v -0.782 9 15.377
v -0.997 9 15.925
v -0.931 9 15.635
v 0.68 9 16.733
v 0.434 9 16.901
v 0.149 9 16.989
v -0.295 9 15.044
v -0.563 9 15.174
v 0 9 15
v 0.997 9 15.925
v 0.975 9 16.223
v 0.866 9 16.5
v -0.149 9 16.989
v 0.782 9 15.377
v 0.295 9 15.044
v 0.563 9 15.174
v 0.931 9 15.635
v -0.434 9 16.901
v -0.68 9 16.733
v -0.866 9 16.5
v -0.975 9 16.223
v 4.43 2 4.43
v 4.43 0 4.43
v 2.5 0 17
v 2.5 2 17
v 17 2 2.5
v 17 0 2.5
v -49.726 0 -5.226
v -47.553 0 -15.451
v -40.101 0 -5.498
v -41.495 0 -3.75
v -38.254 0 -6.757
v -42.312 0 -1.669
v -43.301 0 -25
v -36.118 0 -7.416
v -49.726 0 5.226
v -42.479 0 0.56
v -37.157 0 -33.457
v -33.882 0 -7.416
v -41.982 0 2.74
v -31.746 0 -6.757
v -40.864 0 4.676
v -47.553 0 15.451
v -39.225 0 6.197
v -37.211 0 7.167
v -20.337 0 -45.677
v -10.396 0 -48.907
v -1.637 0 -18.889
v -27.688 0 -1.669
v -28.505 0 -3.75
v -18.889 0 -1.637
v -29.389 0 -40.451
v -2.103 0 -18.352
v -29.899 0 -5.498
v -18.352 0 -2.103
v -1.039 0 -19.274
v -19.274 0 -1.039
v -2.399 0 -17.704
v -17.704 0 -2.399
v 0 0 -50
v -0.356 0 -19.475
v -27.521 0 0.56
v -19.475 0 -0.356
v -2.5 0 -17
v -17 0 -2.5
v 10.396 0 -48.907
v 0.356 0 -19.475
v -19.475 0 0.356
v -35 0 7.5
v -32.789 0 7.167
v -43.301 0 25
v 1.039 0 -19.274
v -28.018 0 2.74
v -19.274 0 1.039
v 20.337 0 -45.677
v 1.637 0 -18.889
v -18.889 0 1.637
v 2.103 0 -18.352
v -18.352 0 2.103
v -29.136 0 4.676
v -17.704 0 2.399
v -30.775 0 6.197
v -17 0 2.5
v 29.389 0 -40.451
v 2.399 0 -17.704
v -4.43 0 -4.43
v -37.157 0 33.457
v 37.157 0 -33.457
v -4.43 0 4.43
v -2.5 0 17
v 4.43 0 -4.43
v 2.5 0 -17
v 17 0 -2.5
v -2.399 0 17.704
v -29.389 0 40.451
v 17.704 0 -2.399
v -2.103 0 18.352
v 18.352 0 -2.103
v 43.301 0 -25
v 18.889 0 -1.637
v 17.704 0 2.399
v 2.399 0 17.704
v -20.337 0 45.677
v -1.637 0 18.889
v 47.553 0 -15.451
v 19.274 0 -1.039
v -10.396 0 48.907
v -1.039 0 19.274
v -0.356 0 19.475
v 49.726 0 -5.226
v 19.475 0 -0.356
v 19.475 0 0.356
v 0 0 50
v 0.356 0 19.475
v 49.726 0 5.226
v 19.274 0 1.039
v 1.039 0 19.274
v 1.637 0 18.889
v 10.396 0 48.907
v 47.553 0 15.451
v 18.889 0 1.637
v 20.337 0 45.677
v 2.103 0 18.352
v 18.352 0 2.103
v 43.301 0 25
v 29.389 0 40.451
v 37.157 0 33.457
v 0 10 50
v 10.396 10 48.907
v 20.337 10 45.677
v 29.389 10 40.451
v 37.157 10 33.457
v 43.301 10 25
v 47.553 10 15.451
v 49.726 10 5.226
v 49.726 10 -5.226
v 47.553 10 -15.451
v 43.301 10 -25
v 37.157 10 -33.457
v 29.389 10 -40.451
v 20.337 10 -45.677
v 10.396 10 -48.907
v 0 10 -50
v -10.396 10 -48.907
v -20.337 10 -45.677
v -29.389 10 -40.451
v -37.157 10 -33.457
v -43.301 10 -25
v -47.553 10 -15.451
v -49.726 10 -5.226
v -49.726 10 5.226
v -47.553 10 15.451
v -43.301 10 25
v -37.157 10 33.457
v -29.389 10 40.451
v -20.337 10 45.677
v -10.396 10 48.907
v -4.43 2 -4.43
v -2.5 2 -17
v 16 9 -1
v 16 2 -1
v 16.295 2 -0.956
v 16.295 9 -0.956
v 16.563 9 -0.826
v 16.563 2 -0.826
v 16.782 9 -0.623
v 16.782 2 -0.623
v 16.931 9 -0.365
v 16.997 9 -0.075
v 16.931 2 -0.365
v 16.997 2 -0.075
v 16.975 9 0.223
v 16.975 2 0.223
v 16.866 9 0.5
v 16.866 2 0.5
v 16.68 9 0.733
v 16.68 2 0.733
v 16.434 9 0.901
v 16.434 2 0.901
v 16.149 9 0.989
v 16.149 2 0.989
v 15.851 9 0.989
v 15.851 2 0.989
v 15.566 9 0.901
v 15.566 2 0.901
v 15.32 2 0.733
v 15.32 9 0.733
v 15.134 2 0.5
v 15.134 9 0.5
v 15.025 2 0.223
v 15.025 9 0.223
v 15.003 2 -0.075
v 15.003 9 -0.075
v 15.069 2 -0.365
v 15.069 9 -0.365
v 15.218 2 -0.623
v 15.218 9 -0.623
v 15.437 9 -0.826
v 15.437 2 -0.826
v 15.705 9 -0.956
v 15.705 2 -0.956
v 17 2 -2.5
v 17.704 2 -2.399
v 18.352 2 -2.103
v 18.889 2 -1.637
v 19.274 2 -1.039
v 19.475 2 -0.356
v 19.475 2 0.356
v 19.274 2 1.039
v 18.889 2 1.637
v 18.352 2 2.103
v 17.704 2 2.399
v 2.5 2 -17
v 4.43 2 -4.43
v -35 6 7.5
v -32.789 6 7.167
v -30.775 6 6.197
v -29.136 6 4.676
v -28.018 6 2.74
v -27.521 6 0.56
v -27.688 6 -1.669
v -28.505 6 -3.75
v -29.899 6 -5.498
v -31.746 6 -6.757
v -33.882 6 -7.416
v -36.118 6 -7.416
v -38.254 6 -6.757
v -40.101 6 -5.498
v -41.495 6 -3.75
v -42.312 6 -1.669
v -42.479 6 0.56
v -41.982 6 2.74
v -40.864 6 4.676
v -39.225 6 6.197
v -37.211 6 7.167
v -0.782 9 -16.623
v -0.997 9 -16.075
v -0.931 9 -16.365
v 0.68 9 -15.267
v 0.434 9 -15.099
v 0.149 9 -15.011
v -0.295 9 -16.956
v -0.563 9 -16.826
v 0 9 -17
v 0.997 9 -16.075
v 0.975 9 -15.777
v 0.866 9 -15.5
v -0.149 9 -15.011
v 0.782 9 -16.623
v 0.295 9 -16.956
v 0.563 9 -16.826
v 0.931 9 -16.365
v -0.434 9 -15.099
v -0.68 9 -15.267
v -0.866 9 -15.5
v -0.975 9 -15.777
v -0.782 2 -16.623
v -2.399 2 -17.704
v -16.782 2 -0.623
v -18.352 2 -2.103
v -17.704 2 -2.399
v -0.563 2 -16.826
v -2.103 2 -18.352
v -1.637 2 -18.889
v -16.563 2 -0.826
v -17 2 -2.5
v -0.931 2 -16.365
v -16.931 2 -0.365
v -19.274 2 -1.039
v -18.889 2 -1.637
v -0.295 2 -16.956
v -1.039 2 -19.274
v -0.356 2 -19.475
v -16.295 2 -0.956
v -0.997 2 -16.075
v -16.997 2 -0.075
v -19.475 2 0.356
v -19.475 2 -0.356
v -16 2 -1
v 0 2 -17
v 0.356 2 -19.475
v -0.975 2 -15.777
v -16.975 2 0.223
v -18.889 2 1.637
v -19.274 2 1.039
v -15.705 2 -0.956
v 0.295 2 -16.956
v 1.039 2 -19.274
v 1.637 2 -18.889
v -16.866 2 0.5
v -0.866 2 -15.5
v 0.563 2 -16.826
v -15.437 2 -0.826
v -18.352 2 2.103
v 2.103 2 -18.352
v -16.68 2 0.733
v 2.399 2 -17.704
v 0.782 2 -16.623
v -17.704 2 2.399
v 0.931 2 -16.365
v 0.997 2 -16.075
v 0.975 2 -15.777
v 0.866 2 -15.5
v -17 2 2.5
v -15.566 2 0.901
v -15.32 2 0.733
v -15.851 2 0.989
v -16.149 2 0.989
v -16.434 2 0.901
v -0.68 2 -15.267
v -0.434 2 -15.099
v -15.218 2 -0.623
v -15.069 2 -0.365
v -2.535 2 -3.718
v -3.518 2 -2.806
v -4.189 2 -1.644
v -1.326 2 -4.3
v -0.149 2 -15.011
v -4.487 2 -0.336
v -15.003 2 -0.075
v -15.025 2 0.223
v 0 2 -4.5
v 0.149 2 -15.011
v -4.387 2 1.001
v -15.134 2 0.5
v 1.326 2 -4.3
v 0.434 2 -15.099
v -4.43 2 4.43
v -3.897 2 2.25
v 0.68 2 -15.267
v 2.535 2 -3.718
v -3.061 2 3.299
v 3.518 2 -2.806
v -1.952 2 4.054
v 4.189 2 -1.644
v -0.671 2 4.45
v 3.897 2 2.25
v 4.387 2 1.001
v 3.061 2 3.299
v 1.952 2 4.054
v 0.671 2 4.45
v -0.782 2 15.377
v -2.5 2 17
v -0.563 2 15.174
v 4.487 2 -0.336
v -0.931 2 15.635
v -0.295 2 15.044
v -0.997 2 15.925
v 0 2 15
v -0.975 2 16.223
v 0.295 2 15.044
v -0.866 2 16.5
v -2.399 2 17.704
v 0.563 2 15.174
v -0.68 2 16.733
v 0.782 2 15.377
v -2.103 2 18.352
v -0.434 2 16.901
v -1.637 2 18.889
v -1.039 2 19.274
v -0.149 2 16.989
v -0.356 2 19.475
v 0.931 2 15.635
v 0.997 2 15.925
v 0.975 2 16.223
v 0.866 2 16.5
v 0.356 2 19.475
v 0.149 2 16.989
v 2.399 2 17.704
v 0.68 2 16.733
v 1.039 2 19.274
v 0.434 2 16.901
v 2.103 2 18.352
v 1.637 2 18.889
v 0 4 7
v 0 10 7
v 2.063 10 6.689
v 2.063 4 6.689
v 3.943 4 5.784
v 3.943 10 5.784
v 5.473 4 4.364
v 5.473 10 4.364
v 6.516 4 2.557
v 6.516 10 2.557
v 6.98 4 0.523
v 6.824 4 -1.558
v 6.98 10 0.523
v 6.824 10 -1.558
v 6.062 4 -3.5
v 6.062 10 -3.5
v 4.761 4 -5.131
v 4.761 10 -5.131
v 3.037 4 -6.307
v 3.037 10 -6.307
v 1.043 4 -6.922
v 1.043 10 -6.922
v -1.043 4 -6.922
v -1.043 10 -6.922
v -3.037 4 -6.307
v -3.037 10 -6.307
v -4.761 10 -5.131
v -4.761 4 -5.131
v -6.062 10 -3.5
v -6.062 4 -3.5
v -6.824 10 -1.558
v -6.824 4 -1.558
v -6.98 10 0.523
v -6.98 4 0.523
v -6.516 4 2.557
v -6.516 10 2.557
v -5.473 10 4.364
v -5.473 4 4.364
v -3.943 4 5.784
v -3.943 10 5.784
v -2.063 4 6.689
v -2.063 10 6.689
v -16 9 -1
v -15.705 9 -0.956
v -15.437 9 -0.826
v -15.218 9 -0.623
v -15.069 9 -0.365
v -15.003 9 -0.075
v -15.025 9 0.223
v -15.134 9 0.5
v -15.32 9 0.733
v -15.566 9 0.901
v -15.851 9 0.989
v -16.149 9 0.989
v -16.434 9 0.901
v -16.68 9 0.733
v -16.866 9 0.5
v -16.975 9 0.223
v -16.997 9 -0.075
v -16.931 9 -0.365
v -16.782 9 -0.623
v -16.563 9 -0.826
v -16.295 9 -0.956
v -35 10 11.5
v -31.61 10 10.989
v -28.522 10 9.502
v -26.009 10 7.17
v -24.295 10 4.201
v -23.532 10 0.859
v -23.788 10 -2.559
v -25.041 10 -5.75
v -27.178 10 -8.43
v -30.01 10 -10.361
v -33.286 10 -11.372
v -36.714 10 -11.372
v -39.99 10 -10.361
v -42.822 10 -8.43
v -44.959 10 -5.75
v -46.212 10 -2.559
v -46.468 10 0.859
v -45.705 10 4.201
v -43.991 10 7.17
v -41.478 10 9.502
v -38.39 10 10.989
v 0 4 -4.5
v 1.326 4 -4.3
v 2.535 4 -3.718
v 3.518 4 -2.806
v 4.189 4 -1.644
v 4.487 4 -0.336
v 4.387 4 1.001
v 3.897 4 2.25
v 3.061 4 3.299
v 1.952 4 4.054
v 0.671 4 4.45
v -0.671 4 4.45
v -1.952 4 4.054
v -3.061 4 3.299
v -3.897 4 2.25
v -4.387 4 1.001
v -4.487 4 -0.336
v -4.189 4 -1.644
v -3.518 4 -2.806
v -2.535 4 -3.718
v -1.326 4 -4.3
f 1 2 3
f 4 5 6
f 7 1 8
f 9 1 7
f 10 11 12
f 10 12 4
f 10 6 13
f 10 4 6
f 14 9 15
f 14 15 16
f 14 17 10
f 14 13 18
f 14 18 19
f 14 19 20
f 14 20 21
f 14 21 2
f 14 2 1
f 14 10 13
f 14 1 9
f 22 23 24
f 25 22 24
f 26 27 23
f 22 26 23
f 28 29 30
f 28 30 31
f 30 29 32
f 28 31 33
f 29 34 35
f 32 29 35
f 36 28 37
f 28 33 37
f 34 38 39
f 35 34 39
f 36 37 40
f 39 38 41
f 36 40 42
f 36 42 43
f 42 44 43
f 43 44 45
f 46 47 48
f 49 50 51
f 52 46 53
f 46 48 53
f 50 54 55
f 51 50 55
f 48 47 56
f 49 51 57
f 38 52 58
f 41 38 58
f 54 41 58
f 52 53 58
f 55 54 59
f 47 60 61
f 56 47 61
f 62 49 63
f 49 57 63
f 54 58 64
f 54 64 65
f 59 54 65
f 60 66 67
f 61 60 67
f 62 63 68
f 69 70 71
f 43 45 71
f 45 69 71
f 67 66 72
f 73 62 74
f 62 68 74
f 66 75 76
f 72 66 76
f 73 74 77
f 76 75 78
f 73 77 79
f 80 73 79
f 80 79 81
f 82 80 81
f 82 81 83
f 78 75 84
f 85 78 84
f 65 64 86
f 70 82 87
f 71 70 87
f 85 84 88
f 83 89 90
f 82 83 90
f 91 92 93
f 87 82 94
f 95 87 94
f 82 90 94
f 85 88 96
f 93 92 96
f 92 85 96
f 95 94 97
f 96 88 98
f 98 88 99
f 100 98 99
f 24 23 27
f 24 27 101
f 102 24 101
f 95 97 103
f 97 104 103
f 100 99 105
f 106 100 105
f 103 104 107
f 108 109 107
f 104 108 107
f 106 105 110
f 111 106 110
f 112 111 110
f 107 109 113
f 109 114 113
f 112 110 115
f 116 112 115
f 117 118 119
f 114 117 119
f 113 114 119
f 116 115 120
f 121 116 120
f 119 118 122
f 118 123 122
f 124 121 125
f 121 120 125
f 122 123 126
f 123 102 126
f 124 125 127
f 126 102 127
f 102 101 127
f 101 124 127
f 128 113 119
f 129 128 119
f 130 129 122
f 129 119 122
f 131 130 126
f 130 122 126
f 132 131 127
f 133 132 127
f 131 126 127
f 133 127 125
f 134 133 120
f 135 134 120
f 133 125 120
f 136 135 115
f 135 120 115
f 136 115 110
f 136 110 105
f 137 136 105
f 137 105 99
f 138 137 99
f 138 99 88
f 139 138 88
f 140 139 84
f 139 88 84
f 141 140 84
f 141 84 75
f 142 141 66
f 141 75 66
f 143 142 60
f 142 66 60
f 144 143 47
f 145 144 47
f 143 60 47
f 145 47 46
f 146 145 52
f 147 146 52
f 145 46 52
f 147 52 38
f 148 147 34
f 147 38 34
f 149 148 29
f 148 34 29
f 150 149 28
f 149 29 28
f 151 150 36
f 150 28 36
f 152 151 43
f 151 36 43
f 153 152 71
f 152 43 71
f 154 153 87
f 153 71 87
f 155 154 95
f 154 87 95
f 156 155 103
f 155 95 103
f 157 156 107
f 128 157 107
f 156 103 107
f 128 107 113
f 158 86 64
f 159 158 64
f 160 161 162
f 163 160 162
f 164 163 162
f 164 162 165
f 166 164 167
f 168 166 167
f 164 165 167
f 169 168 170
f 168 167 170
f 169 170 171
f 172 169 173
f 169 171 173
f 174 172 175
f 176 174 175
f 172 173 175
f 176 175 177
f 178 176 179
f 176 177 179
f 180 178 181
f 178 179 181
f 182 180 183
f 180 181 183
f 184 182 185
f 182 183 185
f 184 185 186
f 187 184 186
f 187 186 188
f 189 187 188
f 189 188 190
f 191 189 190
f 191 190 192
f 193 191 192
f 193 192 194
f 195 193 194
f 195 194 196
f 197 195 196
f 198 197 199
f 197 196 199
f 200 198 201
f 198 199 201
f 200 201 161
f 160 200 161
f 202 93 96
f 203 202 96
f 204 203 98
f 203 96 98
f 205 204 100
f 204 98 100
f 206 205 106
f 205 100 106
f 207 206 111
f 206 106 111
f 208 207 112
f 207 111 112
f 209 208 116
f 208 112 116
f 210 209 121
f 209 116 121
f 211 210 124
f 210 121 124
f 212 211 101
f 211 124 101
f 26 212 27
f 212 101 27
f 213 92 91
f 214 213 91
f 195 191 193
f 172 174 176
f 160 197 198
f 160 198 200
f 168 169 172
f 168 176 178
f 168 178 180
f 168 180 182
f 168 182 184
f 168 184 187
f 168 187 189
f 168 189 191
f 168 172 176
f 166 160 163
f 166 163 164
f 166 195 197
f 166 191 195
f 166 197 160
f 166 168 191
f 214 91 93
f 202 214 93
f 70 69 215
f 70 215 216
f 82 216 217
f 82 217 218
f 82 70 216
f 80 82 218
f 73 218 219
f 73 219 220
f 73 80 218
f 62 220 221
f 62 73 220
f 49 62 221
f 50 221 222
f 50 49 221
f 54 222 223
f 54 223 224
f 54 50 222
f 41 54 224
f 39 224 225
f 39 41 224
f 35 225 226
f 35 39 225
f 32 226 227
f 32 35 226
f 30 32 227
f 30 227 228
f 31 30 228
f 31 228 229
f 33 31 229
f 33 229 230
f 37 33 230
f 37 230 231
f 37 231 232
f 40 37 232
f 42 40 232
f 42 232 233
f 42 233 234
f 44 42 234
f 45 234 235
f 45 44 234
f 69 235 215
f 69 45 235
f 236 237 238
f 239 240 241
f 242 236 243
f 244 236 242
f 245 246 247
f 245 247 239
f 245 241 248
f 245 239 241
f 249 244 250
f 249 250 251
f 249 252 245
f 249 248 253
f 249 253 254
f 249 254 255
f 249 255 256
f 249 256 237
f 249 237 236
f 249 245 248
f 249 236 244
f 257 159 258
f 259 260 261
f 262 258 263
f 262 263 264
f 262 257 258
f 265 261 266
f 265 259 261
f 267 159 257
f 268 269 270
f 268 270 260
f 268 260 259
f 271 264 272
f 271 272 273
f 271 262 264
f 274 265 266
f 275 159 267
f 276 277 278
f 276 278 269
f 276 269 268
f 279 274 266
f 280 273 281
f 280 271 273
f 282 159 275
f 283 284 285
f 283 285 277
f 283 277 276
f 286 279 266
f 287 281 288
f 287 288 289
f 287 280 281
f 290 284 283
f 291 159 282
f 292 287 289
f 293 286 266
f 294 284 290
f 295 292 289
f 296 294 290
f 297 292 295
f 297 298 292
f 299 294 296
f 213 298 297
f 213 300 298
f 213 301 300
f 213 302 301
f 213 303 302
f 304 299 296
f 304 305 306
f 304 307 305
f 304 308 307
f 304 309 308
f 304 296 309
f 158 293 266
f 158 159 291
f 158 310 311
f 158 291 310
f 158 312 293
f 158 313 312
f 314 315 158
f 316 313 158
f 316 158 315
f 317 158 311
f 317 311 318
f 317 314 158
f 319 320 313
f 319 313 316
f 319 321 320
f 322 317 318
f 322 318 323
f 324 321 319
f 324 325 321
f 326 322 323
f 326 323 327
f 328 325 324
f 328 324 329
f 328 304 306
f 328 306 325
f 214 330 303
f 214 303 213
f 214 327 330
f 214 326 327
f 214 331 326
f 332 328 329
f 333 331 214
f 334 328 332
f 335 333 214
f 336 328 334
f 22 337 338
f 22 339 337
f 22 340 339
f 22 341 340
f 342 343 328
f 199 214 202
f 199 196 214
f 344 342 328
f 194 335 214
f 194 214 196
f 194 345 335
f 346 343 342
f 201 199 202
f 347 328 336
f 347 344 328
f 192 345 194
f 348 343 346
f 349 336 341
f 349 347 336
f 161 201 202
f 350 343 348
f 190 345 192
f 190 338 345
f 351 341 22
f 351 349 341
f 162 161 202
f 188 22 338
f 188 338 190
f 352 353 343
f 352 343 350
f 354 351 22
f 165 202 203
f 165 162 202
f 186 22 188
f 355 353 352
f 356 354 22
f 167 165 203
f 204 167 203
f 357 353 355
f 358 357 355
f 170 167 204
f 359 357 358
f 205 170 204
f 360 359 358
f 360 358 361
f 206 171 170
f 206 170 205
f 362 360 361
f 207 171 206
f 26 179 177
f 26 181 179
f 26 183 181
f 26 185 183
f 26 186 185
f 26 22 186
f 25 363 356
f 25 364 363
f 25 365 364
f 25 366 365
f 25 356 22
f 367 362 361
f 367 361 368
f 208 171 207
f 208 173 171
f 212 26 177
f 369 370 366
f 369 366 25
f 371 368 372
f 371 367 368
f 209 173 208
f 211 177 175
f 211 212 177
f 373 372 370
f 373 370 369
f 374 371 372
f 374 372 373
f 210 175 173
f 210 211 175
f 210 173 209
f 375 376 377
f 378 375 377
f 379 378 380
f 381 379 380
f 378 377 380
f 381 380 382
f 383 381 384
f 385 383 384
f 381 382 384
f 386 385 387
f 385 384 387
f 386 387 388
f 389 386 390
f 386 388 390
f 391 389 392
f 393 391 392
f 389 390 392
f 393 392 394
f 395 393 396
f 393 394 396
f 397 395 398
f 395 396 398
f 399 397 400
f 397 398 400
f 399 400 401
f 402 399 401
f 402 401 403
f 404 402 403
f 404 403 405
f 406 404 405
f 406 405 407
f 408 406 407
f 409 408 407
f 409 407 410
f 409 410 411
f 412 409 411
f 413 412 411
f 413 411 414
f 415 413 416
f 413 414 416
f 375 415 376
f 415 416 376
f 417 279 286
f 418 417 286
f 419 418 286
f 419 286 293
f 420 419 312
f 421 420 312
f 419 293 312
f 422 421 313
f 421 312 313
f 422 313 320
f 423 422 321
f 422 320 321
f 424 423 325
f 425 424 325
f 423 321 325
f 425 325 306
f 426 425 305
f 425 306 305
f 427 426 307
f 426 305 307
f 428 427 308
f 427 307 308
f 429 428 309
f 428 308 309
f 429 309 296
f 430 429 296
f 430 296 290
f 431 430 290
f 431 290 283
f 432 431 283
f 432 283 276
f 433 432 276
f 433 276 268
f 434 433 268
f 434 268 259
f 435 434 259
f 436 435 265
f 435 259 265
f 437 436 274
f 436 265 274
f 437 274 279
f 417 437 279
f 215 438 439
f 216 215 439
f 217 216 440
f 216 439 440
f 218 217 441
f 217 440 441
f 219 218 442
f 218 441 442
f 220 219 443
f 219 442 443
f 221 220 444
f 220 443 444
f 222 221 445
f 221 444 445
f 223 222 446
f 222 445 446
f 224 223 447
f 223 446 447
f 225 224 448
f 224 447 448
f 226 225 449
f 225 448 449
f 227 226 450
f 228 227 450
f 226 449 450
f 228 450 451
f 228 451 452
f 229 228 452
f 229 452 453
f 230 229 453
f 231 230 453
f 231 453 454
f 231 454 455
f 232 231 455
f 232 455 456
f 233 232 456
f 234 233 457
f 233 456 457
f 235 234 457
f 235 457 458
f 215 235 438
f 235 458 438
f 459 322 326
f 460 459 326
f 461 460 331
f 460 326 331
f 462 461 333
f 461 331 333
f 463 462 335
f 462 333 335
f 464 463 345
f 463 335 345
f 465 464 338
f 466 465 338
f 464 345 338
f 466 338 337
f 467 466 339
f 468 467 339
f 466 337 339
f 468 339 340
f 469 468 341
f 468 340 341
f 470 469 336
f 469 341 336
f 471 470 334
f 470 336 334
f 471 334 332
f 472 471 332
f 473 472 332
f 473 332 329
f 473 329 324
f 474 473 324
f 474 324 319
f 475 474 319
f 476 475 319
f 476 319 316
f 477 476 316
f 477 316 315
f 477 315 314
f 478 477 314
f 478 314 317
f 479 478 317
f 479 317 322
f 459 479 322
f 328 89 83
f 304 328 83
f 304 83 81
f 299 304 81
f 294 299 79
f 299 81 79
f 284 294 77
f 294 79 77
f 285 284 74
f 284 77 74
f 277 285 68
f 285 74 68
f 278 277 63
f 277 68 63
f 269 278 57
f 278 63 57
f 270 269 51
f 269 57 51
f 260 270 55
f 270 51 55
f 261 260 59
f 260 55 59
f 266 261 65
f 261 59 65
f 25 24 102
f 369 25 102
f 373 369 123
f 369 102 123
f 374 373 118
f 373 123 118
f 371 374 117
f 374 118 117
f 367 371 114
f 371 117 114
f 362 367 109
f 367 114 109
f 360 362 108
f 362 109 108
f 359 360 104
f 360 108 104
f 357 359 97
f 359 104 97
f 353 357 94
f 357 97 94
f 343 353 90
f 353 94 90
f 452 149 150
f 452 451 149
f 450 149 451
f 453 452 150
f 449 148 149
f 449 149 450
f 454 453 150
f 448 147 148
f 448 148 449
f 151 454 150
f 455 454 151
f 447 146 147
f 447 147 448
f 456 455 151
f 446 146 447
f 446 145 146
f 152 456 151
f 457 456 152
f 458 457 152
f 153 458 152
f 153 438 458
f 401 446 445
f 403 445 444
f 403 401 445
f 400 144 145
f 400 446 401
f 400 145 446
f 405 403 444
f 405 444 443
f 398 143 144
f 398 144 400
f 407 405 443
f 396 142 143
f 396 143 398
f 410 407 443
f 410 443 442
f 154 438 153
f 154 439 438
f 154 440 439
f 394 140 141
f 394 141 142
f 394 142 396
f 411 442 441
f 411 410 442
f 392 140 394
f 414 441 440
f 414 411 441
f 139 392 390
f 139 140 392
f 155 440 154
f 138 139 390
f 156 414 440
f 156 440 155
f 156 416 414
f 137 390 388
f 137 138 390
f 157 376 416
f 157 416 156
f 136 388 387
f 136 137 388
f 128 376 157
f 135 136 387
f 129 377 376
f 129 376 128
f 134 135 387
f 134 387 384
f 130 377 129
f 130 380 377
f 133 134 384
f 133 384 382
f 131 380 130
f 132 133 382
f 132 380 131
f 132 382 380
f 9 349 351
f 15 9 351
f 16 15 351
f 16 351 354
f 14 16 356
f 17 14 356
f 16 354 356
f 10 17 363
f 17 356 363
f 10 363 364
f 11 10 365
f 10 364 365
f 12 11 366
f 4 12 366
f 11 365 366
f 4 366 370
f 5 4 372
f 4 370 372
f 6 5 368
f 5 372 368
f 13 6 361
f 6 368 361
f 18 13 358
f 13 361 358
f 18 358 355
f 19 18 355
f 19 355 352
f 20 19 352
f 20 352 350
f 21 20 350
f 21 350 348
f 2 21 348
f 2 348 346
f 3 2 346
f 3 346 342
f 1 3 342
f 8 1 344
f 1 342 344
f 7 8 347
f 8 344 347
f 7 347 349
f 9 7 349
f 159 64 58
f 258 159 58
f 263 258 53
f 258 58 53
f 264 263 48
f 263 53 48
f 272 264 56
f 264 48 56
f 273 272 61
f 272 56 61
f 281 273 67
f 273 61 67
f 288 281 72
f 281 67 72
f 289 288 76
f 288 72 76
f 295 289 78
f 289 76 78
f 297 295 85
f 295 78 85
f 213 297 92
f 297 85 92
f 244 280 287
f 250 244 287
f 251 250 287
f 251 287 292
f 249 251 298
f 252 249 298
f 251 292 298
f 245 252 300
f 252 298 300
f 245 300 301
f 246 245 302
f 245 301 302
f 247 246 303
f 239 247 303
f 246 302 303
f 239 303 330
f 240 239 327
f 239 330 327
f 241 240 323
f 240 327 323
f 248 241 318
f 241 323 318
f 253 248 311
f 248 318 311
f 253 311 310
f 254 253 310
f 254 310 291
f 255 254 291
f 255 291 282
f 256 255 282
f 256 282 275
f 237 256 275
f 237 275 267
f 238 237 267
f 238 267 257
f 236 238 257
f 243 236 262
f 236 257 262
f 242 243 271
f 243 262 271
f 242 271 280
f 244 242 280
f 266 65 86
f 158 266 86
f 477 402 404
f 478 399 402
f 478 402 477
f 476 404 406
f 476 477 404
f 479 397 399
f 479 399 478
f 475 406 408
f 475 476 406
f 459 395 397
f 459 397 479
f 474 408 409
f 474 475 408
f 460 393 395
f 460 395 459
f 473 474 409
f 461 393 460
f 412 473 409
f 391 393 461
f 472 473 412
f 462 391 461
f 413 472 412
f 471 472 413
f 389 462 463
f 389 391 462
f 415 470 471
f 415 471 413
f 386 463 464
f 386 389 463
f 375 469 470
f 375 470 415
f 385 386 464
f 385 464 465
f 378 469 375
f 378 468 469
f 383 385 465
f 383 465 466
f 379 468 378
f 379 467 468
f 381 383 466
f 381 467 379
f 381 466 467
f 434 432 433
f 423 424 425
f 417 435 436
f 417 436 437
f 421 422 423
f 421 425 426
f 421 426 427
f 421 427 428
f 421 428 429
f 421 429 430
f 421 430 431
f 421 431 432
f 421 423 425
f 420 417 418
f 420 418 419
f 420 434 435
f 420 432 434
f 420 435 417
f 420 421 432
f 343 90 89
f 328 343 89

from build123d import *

# Parameters (mm, degrees)
SKETCH1_R           = 50
SKETCH1_R_2         = 7.5
BOSS_EXTRUDE1_DEPTH = 10
CHAMFER1_SIZE       = 4
CUT_EXTRUDE1_DEPTH  = 2
CUT_EXTRUDE2_REACH  = 73.162
SKETCH3_R           = 4.5
SKETCH4_R           = 1
CUT_EXTRUDE3_DEPTH  = 7
SKETCH7_R           = 7
CUT_EXTRUDE4_DEPTH  = 6


with BuildPart() as part:
    # Sketch1 → Boss-Extrude1 (new body)
    with BuildSketch(Plane(origin=(0, 0, 0), x_dir=(1, 0, 0), z_dir=(0, 1, 0))):
        with Locations(Location((0, 0, 0), (0, 0, 270))):
            Circle(SKETCH1_R)
        with Locations(Location((-35, 0, 0), (0, 0, 270))):
            Circle(SKETCH1_R_2, mode=Mode.SUBTRACT)
    extrude(amount=BOSS_EXTRUDE1_DEPTH)

    # Chamfer1
    chamfer1_edges = [part.edges().sort_by_distance(p)[0] for p in [
        (-35, 10, -7.5),
    ]]
    chamfer(chamfer1_edges, length=CHAMFER1_SIZE)

    # Sketch2 → Cut-Extrude1 (cut)
    with BuildSketch(Plane.XZ):
        with BuildLine():
            Line((-17, -2.5), (-4.43, -4.43))
            Line((-4.43, -4.43), (-2.5, -17))
            ThreePointArc((-2.5, -17), (0, -19.5), (2.5, -17))
            Line((2.5, -17), (4.43, -4.43))
            Line((4.43, -4.43), (17, -2.5))
            ThreePointArc((17, -2.5), (19.5, 0), (17, 2.5))
            Line((17, 2.5), (4.43, 4.43))
            Line((4.43, 4.43), (2.5, 17))
            ThreePointArc((2.5, 17), (0, 19.5), (-2.5, 17))
            Line((-2.5, 17), (-4.43, 4.43))
            Line((-4.43, 4.43), (-17, 2.5))
            ThreePointArc((-17, 2.5), (-19.5, 0), (-17, -2.5))
        make_face()
    extrude(amount=-CUT_EXTRUDE1_DEPTH, mode=Mode.SUBTRACT)

    # Sketch3 → Cut-Extrude2 (cut, up to next)
    with BuildSketch(Plane.XZ.offset(-2), mode=Mode.PRIVATE) as cut_extrude2_sk1:
        with Locations(Location((0, 0, 0), (0, 0, 270))):
            Circle(SKETCH3_R)
    cut_extrude2_tool1 = extrude(cut_extrude2_sk1.sketch, amount=-CUT_EXTRUDE2_REACH, mode=Mode.PRIVATE) & part.part
    add(cut_extrude2_tool1.solids().sort_by_distance((0, 2, 0))[0], mode=Mode.SUBTRACT)

    # Sketch4 → Cut-Extrude3 (cut)
    with BuildSketch(Plane.XZ.offset(-2)):
        with Locations(Location((-16, 0, 0), (0, 0, 270))):
            Circle(SKETCH4_R)
        with Locations(Location((0, 16, 0), (0, 0, 270))):
            Circle(SKETCH4_R)
        with Locations(Location((16, 0, 0), (0, 0, 270))):
            Circle(SKETCH4_R)
        with Locations(Location((0, -16, 0), (0, 0, 270))):
            Circle(SKETCH4_R)
    extrude(amount=-CUT_EXTRUDE3_DEPTH, mode=Mode.SUBTRACT)

    # Sketch7 → Cut-Extrude4 (cut)
    with BuildSketch(Plane(origin=(0, 10, 0), x_dir=(1, 0, 0), z_dir=(0, 1, 0))):
        with Locations(Location((0, 0, 0), (0, 0, 270))):
            Circle(SKETCH7_R)
    extrude(amount=-CUT_EXTRUDE4_DEPTH, mode=Mode.SUBTRACT)


solid = part.part
